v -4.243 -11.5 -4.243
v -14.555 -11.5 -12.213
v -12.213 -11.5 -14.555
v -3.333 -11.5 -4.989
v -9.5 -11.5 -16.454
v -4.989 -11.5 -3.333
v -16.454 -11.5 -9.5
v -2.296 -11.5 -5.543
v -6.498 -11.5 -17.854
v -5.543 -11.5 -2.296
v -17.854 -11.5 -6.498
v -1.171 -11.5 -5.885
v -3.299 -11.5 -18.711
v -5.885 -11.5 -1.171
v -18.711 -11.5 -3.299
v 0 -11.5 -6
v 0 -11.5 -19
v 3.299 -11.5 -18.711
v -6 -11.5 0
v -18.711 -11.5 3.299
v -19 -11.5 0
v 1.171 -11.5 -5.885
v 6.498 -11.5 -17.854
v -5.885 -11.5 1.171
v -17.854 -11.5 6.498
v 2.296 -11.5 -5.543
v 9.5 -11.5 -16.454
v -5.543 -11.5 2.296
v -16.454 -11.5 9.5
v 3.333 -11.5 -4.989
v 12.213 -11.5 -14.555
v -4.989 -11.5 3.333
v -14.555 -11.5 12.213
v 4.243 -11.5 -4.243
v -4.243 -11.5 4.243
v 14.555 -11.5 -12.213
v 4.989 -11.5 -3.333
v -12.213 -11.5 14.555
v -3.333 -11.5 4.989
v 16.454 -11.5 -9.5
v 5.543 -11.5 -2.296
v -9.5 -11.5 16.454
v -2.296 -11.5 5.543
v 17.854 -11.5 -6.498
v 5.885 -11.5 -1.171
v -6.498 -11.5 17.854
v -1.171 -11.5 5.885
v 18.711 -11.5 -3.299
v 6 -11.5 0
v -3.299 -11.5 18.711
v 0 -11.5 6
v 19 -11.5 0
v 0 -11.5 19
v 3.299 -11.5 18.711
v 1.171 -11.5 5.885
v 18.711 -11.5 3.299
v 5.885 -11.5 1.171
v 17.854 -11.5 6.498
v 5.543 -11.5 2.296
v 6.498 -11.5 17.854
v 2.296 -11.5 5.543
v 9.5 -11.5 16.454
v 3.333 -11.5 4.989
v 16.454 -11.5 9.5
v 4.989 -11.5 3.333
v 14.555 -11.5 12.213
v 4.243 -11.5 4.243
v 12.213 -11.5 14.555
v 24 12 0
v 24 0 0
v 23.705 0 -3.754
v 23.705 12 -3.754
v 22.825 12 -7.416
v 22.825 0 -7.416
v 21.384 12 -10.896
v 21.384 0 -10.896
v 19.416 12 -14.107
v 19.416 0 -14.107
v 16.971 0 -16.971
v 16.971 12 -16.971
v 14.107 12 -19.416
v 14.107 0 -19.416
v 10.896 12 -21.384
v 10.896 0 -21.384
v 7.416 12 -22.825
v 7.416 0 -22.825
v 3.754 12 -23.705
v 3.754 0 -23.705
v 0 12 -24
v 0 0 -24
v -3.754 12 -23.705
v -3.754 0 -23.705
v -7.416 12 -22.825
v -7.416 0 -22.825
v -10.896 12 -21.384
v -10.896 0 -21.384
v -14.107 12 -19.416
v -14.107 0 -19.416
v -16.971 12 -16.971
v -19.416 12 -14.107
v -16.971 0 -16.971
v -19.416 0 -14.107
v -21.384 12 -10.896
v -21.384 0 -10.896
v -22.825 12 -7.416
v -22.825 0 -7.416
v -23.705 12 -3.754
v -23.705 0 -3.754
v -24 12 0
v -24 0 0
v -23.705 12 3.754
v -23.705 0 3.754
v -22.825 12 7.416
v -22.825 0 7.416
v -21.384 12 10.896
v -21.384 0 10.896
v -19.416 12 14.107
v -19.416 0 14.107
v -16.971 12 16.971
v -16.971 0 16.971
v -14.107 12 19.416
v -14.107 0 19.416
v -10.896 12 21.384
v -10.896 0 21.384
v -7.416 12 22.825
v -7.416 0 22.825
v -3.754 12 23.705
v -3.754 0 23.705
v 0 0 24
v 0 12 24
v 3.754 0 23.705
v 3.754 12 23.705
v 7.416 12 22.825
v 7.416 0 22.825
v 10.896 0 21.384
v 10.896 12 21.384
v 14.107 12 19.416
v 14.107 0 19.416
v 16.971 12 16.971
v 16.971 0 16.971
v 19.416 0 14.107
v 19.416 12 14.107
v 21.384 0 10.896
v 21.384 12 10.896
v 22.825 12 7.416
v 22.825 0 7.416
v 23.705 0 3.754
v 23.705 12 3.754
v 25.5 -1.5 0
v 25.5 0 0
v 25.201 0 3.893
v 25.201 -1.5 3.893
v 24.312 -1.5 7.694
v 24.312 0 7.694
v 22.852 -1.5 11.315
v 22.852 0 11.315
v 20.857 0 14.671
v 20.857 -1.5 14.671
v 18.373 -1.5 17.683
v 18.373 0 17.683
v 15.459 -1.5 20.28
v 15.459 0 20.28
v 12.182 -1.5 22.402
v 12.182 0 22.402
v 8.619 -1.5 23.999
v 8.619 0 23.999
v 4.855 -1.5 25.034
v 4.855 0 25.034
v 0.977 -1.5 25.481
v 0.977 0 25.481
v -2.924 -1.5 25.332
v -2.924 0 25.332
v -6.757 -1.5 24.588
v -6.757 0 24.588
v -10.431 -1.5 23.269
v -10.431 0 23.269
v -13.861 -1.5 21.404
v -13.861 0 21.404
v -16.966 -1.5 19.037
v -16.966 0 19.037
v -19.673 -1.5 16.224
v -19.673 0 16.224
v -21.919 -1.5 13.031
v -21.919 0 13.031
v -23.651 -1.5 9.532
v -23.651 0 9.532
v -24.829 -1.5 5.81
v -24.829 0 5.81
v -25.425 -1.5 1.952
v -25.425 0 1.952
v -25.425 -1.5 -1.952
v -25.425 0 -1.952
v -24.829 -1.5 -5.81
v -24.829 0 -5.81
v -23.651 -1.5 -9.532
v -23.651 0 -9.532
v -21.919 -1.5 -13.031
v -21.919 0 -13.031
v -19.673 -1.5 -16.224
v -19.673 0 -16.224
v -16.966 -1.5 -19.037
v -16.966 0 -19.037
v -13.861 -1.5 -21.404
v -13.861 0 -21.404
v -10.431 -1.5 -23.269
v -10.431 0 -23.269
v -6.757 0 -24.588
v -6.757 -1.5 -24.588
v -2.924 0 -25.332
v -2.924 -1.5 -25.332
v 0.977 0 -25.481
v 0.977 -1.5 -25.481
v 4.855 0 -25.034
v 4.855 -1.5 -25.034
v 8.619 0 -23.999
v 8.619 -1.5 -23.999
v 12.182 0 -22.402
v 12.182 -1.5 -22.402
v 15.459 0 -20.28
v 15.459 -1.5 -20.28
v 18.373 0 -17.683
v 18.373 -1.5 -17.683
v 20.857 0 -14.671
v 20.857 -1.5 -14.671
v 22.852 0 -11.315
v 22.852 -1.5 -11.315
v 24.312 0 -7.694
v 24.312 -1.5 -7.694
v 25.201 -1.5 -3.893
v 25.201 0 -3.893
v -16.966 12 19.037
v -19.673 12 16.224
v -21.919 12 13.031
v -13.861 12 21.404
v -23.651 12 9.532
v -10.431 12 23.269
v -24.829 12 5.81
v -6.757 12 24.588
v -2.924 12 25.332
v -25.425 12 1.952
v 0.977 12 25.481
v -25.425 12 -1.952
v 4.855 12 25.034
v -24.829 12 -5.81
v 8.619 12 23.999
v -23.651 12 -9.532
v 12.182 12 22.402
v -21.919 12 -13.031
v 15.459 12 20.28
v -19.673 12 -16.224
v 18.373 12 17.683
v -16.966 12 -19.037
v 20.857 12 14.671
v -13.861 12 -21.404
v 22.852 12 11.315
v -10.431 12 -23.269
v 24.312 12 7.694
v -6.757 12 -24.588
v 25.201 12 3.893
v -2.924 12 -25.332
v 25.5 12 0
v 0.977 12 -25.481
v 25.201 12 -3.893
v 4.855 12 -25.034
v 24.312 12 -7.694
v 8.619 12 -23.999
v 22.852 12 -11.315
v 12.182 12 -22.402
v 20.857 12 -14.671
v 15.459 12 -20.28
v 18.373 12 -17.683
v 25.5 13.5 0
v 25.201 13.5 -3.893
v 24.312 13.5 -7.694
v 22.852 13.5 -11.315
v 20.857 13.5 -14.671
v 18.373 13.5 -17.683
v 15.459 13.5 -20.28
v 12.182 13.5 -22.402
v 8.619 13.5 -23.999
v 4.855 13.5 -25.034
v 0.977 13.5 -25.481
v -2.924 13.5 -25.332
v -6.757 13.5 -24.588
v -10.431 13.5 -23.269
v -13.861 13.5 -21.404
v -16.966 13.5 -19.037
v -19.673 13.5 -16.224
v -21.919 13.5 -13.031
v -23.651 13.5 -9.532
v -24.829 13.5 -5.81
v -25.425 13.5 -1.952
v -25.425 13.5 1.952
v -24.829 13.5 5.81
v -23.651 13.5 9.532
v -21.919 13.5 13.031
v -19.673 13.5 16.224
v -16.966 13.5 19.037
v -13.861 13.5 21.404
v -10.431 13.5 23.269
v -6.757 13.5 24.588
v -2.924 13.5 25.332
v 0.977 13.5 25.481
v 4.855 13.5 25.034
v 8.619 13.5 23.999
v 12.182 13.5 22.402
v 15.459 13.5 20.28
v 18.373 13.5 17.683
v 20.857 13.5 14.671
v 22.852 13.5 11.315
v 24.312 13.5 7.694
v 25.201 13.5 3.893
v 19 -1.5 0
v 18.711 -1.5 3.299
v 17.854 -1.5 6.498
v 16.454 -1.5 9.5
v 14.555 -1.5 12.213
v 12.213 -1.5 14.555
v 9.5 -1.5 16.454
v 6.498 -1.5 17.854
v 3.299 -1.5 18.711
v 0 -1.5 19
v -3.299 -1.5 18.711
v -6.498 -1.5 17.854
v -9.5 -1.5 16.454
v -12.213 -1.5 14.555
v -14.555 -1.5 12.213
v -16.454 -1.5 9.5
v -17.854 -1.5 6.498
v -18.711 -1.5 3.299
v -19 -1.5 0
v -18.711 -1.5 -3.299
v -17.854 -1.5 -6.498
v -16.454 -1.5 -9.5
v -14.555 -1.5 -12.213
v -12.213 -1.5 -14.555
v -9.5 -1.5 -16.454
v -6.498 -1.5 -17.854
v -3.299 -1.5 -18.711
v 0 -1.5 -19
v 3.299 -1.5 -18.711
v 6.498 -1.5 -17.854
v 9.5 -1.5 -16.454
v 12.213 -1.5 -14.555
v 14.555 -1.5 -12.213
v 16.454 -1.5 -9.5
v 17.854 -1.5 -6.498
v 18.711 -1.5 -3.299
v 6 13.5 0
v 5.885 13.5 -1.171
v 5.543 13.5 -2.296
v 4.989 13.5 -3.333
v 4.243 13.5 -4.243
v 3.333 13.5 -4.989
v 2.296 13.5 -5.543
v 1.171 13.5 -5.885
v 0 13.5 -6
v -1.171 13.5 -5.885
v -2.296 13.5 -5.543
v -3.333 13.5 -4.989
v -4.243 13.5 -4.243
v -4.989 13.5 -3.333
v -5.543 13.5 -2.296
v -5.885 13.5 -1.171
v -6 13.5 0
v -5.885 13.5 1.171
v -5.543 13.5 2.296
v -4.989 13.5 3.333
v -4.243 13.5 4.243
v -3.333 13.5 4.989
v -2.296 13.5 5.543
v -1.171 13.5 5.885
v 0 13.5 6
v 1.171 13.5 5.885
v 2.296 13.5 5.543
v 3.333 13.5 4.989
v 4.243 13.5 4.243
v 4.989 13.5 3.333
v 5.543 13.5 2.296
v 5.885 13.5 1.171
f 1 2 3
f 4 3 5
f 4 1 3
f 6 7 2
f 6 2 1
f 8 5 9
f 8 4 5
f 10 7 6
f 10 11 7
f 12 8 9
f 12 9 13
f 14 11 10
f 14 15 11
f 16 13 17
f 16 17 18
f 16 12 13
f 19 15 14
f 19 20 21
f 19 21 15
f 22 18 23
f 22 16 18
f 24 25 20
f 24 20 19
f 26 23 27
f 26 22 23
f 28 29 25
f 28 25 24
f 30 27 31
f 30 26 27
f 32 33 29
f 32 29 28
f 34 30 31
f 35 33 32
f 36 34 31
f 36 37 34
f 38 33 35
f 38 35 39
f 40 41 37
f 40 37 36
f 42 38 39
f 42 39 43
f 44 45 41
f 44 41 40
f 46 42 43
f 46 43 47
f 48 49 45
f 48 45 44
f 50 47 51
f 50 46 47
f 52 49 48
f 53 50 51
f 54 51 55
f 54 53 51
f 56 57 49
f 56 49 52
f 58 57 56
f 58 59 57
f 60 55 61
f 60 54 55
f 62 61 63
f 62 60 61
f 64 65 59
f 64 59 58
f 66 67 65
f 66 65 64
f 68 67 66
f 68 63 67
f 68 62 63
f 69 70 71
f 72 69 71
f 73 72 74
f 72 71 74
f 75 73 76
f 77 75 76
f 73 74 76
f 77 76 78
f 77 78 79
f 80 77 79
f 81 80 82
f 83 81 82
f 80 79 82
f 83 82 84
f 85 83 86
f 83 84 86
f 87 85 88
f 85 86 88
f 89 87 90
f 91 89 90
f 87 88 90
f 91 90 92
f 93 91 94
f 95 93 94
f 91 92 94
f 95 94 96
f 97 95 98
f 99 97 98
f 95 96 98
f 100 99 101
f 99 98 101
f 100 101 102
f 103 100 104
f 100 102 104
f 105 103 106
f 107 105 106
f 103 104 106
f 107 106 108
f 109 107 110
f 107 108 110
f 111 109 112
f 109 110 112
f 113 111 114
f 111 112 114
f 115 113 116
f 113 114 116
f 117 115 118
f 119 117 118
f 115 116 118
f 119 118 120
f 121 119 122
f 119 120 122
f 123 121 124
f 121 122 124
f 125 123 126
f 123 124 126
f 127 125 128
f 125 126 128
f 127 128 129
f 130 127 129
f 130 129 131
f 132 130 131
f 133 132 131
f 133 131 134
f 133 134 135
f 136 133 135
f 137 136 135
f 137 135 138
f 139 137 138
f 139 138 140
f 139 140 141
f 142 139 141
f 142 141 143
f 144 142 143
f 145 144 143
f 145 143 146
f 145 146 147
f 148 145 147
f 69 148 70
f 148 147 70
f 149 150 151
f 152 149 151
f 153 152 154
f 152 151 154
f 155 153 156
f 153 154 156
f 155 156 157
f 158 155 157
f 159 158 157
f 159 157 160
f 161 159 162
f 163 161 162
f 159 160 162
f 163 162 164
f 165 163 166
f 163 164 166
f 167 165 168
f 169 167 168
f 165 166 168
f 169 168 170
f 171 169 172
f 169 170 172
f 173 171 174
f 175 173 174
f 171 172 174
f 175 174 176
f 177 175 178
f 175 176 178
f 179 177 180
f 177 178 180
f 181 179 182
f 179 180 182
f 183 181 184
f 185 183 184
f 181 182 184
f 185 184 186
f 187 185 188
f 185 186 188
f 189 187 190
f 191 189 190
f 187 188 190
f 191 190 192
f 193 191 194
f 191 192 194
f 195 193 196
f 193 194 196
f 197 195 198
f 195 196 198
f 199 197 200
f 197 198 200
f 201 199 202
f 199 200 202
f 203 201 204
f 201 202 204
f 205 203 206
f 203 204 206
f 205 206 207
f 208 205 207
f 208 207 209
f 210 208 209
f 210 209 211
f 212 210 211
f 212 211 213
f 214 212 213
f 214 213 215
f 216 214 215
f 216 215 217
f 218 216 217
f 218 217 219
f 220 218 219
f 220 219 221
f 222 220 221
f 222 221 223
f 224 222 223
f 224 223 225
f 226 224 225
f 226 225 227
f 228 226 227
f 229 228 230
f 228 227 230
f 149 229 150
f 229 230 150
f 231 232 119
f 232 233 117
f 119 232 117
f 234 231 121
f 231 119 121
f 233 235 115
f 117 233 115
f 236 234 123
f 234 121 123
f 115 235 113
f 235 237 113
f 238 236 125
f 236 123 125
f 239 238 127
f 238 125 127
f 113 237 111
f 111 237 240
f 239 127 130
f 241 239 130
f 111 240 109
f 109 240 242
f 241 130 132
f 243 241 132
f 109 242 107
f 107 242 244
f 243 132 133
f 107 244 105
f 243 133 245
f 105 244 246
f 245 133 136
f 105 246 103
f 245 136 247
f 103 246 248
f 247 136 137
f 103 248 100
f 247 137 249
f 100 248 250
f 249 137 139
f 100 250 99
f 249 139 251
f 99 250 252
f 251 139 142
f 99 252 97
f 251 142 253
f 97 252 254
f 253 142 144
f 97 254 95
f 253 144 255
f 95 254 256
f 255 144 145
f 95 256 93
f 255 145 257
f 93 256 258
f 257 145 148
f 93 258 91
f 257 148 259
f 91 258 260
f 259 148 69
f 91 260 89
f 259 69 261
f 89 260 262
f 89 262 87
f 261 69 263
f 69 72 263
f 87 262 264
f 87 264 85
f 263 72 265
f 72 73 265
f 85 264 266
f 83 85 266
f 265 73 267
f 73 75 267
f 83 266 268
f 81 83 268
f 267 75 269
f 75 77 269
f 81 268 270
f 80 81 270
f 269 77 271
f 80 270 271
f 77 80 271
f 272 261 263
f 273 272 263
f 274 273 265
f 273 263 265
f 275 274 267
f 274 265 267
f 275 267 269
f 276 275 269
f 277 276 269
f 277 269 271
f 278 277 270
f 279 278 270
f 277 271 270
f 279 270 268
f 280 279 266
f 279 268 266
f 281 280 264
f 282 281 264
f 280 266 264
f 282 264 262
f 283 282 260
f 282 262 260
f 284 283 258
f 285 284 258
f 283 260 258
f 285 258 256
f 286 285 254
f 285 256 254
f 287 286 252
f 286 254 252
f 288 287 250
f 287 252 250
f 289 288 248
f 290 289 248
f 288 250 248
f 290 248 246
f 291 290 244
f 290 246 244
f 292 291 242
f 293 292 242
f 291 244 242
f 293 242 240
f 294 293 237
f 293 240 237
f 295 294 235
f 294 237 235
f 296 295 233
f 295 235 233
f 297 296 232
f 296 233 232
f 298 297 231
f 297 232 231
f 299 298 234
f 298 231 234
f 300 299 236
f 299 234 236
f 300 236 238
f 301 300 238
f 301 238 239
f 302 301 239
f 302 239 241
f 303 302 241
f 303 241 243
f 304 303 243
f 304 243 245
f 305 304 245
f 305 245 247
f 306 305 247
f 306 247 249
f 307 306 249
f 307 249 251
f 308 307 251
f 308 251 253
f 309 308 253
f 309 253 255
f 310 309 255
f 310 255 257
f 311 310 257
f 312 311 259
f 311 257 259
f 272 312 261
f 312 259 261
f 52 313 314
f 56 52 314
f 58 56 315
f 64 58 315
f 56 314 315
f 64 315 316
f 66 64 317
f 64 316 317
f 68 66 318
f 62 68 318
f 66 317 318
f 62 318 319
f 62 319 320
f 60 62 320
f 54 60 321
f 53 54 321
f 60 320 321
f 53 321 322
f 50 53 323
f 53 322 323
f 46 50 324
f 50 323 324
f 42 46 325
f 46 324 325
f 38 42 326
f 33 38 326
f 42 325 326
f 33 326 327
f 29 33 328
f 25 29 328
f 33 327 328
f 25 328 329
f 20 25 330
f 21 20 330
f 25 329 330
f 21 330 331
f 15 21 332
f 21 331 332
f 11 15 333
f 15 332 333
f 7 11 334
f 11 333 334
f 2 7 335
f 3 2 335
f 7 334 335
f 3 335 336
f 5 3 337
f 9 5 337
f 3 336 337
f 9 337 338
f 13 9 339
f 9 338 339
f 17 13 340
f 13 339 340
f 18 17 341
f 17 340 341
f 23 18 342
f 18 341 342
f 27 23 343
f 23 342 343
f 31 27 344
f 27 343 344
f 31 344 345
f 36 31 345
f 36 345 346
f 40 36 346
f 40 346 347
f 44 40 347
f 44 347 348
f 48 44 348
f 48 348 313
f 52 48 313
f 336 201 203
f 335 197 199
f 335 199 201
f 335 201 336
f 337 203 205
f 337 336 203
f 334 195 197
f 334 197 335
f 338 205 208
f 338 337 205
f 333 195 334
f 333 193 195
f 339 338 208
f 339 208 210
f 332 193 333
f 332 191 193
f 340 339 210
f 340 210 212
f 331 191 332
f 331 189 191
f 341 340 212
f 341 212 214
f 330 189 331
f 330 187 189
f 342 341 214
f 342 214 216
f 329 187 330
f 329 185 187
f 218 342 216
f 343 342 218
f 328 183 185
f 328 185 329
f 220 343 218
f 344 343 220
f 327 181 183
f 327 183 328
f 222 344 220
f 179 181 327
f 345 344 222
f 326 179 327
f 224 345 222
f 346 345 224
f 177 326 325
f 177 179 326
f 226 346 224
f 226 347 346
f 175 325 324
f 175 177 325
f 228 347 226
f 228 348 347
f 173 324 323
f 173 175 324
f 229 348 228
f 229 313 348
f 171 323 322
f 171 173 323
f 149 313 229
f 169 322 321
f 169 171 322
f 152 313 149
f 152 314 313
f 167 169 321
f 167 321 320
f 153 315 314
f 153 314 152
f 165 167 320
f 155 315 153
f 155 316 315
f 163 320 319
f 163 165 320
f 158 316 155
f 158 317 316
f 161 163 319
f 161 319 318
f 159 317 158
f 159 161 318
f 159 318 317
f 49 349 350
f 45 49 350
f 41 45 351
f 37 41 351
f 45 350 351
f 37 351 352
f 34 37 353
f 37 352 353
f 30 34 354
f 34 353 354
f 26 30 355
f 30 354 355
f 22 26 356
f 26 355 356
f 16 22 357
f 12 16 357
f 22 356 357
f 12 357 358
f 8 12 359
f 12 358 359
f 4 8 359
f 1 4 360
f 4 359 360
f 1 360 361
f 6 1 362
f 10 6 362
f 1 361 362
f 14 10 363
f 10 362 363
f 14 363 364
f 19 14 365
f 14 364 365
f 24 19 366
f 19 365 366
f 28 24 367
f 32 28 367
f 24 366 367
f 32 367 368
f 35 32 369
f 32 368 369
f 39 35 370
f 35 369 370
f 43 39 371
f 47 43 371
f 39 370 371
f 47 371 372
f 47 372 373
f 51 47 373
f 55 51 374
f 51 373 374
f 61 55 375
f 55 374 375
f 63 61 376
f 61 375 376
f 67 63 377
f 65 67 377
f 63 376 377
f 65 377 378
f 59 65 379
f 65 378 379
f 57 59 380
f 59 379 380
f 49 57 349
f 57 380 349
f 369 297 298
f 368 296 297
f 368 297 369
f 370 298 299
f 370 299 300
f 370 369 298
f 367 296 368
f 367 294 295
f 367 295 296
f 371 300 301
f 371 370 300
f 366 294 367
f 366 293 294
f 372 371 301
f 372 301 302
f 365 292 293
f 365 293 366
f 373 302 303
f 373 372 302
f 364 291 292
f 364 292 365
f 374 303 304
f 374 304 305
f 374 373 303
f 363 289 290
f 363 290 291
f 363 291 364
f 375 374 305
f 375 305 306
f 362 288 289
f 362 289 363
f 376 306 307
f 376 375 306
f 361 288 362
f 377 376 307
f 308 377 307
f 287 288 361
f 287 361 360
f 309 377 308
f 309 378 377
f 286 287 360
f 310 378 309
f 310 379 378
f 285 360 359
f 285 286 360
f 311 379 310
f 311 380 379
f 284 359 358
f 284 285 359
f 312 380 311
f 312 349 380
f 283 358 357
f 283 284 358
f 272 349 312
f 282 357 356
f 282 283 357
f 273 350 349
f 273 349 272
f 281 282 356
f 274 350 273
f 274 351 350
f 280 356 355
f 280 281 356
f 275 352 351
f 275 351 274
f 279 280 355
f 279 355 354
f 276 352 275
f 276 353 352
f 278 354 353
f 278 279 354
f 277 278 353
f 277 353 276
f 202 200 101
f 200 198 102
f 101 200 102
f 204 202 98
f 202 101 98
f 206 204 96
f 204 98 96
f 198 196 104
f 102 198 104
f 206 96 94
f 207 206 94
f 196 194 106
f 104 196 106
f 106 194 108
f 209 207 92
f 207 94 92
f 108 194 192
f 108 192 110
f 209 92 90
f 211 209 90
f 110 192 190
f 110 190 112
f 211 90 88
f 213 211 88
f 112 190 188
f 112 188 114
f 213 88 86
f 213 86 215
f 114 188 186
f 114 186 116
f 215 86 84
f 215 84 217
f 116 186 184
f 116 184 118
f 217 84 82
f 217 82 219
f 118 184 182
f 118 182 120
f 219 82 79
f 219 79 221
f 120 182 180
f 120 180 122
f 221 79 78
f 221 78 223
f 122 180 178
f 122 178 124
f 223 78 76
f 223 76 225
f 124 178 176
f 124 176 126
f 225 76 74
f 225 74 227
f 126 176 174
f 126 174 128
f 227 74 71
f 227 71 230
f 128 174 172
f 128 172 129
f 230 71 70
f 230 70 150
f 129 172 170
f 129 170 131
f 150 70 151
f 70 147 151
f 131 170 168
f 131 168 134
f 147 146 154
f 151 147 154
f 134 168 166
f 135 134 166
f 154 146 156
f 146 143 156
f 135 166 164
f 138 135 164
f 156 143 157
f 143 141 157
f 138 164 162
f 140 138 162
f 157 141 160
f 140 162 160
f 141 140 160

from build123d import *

# Parameters (mm, degrees)
SKETCH1_R           = 24
BOSS_EXTRUDE1_DEPTH = 12
SKETCH3_R           = 25.5
BOSS_EXTRUDE3_DEPTH = 1.5
SKETCH4_R           = 25.5
BOSS_EXTRUDE4_DEPTH = 1.5
SKETCH5_R           = 19
BOSS_EXTRUDE5_DEPTH = 10
SKETCH6_R           = 6
CUT_EXTRUDE1_DEPTH  = 25


with BuildPart() as part:
    # Sketch1 → Boss-Extrude1 (new body)
    with BuildSketch(Plane(origin=(0, 0, 0), x_dir=(1, 0, 0), z_dir=(0, 1, 0))):
        Circle(SKETCH1_R)
    extrude(amount=BOSS_EXTRUDE1_DEPTH)

    # Sketch3 → Boss-Extrude3 (add)
    with BuildSketch(Plane(origin=(0, 12, 0), x_dir=(1, 0, 0), z_dir=(0, 1, 0))):
        Circle(SKETCH3_R)
    extrude(amount=BOSS_EXTRUDE3_DEPTH)

    # Sketch4 → Boss-Extrude4 (add)
    with BuildSketch(Plane.XZ):
        Circle(SKETCH4_R)
    extrude(amount=BOSS_EXTRUDE4_DEPTH)

    # Sketch5 → Boss-Extrude5 (add)
    with BuildSketch(Plane.XZ.offset(1.5)):
        Circle(SKETCH5_R)
    extrude(amount=BOSS_EXTRUDE5_DEPTH)

    # Sketch6 → Cut-Extrude1 (cut)
    with BuildSketch(Plane(origin=(0, 13.5, 0), x_dir=(1, 0, 0), z_dir=(0, 1, 0))):
        Circle(SKETCH6_R)
    extrude(amount=-CUT_EXTRUDE1_DEPTH, mode=Mode.SUBTRACT)


solid = part.part
